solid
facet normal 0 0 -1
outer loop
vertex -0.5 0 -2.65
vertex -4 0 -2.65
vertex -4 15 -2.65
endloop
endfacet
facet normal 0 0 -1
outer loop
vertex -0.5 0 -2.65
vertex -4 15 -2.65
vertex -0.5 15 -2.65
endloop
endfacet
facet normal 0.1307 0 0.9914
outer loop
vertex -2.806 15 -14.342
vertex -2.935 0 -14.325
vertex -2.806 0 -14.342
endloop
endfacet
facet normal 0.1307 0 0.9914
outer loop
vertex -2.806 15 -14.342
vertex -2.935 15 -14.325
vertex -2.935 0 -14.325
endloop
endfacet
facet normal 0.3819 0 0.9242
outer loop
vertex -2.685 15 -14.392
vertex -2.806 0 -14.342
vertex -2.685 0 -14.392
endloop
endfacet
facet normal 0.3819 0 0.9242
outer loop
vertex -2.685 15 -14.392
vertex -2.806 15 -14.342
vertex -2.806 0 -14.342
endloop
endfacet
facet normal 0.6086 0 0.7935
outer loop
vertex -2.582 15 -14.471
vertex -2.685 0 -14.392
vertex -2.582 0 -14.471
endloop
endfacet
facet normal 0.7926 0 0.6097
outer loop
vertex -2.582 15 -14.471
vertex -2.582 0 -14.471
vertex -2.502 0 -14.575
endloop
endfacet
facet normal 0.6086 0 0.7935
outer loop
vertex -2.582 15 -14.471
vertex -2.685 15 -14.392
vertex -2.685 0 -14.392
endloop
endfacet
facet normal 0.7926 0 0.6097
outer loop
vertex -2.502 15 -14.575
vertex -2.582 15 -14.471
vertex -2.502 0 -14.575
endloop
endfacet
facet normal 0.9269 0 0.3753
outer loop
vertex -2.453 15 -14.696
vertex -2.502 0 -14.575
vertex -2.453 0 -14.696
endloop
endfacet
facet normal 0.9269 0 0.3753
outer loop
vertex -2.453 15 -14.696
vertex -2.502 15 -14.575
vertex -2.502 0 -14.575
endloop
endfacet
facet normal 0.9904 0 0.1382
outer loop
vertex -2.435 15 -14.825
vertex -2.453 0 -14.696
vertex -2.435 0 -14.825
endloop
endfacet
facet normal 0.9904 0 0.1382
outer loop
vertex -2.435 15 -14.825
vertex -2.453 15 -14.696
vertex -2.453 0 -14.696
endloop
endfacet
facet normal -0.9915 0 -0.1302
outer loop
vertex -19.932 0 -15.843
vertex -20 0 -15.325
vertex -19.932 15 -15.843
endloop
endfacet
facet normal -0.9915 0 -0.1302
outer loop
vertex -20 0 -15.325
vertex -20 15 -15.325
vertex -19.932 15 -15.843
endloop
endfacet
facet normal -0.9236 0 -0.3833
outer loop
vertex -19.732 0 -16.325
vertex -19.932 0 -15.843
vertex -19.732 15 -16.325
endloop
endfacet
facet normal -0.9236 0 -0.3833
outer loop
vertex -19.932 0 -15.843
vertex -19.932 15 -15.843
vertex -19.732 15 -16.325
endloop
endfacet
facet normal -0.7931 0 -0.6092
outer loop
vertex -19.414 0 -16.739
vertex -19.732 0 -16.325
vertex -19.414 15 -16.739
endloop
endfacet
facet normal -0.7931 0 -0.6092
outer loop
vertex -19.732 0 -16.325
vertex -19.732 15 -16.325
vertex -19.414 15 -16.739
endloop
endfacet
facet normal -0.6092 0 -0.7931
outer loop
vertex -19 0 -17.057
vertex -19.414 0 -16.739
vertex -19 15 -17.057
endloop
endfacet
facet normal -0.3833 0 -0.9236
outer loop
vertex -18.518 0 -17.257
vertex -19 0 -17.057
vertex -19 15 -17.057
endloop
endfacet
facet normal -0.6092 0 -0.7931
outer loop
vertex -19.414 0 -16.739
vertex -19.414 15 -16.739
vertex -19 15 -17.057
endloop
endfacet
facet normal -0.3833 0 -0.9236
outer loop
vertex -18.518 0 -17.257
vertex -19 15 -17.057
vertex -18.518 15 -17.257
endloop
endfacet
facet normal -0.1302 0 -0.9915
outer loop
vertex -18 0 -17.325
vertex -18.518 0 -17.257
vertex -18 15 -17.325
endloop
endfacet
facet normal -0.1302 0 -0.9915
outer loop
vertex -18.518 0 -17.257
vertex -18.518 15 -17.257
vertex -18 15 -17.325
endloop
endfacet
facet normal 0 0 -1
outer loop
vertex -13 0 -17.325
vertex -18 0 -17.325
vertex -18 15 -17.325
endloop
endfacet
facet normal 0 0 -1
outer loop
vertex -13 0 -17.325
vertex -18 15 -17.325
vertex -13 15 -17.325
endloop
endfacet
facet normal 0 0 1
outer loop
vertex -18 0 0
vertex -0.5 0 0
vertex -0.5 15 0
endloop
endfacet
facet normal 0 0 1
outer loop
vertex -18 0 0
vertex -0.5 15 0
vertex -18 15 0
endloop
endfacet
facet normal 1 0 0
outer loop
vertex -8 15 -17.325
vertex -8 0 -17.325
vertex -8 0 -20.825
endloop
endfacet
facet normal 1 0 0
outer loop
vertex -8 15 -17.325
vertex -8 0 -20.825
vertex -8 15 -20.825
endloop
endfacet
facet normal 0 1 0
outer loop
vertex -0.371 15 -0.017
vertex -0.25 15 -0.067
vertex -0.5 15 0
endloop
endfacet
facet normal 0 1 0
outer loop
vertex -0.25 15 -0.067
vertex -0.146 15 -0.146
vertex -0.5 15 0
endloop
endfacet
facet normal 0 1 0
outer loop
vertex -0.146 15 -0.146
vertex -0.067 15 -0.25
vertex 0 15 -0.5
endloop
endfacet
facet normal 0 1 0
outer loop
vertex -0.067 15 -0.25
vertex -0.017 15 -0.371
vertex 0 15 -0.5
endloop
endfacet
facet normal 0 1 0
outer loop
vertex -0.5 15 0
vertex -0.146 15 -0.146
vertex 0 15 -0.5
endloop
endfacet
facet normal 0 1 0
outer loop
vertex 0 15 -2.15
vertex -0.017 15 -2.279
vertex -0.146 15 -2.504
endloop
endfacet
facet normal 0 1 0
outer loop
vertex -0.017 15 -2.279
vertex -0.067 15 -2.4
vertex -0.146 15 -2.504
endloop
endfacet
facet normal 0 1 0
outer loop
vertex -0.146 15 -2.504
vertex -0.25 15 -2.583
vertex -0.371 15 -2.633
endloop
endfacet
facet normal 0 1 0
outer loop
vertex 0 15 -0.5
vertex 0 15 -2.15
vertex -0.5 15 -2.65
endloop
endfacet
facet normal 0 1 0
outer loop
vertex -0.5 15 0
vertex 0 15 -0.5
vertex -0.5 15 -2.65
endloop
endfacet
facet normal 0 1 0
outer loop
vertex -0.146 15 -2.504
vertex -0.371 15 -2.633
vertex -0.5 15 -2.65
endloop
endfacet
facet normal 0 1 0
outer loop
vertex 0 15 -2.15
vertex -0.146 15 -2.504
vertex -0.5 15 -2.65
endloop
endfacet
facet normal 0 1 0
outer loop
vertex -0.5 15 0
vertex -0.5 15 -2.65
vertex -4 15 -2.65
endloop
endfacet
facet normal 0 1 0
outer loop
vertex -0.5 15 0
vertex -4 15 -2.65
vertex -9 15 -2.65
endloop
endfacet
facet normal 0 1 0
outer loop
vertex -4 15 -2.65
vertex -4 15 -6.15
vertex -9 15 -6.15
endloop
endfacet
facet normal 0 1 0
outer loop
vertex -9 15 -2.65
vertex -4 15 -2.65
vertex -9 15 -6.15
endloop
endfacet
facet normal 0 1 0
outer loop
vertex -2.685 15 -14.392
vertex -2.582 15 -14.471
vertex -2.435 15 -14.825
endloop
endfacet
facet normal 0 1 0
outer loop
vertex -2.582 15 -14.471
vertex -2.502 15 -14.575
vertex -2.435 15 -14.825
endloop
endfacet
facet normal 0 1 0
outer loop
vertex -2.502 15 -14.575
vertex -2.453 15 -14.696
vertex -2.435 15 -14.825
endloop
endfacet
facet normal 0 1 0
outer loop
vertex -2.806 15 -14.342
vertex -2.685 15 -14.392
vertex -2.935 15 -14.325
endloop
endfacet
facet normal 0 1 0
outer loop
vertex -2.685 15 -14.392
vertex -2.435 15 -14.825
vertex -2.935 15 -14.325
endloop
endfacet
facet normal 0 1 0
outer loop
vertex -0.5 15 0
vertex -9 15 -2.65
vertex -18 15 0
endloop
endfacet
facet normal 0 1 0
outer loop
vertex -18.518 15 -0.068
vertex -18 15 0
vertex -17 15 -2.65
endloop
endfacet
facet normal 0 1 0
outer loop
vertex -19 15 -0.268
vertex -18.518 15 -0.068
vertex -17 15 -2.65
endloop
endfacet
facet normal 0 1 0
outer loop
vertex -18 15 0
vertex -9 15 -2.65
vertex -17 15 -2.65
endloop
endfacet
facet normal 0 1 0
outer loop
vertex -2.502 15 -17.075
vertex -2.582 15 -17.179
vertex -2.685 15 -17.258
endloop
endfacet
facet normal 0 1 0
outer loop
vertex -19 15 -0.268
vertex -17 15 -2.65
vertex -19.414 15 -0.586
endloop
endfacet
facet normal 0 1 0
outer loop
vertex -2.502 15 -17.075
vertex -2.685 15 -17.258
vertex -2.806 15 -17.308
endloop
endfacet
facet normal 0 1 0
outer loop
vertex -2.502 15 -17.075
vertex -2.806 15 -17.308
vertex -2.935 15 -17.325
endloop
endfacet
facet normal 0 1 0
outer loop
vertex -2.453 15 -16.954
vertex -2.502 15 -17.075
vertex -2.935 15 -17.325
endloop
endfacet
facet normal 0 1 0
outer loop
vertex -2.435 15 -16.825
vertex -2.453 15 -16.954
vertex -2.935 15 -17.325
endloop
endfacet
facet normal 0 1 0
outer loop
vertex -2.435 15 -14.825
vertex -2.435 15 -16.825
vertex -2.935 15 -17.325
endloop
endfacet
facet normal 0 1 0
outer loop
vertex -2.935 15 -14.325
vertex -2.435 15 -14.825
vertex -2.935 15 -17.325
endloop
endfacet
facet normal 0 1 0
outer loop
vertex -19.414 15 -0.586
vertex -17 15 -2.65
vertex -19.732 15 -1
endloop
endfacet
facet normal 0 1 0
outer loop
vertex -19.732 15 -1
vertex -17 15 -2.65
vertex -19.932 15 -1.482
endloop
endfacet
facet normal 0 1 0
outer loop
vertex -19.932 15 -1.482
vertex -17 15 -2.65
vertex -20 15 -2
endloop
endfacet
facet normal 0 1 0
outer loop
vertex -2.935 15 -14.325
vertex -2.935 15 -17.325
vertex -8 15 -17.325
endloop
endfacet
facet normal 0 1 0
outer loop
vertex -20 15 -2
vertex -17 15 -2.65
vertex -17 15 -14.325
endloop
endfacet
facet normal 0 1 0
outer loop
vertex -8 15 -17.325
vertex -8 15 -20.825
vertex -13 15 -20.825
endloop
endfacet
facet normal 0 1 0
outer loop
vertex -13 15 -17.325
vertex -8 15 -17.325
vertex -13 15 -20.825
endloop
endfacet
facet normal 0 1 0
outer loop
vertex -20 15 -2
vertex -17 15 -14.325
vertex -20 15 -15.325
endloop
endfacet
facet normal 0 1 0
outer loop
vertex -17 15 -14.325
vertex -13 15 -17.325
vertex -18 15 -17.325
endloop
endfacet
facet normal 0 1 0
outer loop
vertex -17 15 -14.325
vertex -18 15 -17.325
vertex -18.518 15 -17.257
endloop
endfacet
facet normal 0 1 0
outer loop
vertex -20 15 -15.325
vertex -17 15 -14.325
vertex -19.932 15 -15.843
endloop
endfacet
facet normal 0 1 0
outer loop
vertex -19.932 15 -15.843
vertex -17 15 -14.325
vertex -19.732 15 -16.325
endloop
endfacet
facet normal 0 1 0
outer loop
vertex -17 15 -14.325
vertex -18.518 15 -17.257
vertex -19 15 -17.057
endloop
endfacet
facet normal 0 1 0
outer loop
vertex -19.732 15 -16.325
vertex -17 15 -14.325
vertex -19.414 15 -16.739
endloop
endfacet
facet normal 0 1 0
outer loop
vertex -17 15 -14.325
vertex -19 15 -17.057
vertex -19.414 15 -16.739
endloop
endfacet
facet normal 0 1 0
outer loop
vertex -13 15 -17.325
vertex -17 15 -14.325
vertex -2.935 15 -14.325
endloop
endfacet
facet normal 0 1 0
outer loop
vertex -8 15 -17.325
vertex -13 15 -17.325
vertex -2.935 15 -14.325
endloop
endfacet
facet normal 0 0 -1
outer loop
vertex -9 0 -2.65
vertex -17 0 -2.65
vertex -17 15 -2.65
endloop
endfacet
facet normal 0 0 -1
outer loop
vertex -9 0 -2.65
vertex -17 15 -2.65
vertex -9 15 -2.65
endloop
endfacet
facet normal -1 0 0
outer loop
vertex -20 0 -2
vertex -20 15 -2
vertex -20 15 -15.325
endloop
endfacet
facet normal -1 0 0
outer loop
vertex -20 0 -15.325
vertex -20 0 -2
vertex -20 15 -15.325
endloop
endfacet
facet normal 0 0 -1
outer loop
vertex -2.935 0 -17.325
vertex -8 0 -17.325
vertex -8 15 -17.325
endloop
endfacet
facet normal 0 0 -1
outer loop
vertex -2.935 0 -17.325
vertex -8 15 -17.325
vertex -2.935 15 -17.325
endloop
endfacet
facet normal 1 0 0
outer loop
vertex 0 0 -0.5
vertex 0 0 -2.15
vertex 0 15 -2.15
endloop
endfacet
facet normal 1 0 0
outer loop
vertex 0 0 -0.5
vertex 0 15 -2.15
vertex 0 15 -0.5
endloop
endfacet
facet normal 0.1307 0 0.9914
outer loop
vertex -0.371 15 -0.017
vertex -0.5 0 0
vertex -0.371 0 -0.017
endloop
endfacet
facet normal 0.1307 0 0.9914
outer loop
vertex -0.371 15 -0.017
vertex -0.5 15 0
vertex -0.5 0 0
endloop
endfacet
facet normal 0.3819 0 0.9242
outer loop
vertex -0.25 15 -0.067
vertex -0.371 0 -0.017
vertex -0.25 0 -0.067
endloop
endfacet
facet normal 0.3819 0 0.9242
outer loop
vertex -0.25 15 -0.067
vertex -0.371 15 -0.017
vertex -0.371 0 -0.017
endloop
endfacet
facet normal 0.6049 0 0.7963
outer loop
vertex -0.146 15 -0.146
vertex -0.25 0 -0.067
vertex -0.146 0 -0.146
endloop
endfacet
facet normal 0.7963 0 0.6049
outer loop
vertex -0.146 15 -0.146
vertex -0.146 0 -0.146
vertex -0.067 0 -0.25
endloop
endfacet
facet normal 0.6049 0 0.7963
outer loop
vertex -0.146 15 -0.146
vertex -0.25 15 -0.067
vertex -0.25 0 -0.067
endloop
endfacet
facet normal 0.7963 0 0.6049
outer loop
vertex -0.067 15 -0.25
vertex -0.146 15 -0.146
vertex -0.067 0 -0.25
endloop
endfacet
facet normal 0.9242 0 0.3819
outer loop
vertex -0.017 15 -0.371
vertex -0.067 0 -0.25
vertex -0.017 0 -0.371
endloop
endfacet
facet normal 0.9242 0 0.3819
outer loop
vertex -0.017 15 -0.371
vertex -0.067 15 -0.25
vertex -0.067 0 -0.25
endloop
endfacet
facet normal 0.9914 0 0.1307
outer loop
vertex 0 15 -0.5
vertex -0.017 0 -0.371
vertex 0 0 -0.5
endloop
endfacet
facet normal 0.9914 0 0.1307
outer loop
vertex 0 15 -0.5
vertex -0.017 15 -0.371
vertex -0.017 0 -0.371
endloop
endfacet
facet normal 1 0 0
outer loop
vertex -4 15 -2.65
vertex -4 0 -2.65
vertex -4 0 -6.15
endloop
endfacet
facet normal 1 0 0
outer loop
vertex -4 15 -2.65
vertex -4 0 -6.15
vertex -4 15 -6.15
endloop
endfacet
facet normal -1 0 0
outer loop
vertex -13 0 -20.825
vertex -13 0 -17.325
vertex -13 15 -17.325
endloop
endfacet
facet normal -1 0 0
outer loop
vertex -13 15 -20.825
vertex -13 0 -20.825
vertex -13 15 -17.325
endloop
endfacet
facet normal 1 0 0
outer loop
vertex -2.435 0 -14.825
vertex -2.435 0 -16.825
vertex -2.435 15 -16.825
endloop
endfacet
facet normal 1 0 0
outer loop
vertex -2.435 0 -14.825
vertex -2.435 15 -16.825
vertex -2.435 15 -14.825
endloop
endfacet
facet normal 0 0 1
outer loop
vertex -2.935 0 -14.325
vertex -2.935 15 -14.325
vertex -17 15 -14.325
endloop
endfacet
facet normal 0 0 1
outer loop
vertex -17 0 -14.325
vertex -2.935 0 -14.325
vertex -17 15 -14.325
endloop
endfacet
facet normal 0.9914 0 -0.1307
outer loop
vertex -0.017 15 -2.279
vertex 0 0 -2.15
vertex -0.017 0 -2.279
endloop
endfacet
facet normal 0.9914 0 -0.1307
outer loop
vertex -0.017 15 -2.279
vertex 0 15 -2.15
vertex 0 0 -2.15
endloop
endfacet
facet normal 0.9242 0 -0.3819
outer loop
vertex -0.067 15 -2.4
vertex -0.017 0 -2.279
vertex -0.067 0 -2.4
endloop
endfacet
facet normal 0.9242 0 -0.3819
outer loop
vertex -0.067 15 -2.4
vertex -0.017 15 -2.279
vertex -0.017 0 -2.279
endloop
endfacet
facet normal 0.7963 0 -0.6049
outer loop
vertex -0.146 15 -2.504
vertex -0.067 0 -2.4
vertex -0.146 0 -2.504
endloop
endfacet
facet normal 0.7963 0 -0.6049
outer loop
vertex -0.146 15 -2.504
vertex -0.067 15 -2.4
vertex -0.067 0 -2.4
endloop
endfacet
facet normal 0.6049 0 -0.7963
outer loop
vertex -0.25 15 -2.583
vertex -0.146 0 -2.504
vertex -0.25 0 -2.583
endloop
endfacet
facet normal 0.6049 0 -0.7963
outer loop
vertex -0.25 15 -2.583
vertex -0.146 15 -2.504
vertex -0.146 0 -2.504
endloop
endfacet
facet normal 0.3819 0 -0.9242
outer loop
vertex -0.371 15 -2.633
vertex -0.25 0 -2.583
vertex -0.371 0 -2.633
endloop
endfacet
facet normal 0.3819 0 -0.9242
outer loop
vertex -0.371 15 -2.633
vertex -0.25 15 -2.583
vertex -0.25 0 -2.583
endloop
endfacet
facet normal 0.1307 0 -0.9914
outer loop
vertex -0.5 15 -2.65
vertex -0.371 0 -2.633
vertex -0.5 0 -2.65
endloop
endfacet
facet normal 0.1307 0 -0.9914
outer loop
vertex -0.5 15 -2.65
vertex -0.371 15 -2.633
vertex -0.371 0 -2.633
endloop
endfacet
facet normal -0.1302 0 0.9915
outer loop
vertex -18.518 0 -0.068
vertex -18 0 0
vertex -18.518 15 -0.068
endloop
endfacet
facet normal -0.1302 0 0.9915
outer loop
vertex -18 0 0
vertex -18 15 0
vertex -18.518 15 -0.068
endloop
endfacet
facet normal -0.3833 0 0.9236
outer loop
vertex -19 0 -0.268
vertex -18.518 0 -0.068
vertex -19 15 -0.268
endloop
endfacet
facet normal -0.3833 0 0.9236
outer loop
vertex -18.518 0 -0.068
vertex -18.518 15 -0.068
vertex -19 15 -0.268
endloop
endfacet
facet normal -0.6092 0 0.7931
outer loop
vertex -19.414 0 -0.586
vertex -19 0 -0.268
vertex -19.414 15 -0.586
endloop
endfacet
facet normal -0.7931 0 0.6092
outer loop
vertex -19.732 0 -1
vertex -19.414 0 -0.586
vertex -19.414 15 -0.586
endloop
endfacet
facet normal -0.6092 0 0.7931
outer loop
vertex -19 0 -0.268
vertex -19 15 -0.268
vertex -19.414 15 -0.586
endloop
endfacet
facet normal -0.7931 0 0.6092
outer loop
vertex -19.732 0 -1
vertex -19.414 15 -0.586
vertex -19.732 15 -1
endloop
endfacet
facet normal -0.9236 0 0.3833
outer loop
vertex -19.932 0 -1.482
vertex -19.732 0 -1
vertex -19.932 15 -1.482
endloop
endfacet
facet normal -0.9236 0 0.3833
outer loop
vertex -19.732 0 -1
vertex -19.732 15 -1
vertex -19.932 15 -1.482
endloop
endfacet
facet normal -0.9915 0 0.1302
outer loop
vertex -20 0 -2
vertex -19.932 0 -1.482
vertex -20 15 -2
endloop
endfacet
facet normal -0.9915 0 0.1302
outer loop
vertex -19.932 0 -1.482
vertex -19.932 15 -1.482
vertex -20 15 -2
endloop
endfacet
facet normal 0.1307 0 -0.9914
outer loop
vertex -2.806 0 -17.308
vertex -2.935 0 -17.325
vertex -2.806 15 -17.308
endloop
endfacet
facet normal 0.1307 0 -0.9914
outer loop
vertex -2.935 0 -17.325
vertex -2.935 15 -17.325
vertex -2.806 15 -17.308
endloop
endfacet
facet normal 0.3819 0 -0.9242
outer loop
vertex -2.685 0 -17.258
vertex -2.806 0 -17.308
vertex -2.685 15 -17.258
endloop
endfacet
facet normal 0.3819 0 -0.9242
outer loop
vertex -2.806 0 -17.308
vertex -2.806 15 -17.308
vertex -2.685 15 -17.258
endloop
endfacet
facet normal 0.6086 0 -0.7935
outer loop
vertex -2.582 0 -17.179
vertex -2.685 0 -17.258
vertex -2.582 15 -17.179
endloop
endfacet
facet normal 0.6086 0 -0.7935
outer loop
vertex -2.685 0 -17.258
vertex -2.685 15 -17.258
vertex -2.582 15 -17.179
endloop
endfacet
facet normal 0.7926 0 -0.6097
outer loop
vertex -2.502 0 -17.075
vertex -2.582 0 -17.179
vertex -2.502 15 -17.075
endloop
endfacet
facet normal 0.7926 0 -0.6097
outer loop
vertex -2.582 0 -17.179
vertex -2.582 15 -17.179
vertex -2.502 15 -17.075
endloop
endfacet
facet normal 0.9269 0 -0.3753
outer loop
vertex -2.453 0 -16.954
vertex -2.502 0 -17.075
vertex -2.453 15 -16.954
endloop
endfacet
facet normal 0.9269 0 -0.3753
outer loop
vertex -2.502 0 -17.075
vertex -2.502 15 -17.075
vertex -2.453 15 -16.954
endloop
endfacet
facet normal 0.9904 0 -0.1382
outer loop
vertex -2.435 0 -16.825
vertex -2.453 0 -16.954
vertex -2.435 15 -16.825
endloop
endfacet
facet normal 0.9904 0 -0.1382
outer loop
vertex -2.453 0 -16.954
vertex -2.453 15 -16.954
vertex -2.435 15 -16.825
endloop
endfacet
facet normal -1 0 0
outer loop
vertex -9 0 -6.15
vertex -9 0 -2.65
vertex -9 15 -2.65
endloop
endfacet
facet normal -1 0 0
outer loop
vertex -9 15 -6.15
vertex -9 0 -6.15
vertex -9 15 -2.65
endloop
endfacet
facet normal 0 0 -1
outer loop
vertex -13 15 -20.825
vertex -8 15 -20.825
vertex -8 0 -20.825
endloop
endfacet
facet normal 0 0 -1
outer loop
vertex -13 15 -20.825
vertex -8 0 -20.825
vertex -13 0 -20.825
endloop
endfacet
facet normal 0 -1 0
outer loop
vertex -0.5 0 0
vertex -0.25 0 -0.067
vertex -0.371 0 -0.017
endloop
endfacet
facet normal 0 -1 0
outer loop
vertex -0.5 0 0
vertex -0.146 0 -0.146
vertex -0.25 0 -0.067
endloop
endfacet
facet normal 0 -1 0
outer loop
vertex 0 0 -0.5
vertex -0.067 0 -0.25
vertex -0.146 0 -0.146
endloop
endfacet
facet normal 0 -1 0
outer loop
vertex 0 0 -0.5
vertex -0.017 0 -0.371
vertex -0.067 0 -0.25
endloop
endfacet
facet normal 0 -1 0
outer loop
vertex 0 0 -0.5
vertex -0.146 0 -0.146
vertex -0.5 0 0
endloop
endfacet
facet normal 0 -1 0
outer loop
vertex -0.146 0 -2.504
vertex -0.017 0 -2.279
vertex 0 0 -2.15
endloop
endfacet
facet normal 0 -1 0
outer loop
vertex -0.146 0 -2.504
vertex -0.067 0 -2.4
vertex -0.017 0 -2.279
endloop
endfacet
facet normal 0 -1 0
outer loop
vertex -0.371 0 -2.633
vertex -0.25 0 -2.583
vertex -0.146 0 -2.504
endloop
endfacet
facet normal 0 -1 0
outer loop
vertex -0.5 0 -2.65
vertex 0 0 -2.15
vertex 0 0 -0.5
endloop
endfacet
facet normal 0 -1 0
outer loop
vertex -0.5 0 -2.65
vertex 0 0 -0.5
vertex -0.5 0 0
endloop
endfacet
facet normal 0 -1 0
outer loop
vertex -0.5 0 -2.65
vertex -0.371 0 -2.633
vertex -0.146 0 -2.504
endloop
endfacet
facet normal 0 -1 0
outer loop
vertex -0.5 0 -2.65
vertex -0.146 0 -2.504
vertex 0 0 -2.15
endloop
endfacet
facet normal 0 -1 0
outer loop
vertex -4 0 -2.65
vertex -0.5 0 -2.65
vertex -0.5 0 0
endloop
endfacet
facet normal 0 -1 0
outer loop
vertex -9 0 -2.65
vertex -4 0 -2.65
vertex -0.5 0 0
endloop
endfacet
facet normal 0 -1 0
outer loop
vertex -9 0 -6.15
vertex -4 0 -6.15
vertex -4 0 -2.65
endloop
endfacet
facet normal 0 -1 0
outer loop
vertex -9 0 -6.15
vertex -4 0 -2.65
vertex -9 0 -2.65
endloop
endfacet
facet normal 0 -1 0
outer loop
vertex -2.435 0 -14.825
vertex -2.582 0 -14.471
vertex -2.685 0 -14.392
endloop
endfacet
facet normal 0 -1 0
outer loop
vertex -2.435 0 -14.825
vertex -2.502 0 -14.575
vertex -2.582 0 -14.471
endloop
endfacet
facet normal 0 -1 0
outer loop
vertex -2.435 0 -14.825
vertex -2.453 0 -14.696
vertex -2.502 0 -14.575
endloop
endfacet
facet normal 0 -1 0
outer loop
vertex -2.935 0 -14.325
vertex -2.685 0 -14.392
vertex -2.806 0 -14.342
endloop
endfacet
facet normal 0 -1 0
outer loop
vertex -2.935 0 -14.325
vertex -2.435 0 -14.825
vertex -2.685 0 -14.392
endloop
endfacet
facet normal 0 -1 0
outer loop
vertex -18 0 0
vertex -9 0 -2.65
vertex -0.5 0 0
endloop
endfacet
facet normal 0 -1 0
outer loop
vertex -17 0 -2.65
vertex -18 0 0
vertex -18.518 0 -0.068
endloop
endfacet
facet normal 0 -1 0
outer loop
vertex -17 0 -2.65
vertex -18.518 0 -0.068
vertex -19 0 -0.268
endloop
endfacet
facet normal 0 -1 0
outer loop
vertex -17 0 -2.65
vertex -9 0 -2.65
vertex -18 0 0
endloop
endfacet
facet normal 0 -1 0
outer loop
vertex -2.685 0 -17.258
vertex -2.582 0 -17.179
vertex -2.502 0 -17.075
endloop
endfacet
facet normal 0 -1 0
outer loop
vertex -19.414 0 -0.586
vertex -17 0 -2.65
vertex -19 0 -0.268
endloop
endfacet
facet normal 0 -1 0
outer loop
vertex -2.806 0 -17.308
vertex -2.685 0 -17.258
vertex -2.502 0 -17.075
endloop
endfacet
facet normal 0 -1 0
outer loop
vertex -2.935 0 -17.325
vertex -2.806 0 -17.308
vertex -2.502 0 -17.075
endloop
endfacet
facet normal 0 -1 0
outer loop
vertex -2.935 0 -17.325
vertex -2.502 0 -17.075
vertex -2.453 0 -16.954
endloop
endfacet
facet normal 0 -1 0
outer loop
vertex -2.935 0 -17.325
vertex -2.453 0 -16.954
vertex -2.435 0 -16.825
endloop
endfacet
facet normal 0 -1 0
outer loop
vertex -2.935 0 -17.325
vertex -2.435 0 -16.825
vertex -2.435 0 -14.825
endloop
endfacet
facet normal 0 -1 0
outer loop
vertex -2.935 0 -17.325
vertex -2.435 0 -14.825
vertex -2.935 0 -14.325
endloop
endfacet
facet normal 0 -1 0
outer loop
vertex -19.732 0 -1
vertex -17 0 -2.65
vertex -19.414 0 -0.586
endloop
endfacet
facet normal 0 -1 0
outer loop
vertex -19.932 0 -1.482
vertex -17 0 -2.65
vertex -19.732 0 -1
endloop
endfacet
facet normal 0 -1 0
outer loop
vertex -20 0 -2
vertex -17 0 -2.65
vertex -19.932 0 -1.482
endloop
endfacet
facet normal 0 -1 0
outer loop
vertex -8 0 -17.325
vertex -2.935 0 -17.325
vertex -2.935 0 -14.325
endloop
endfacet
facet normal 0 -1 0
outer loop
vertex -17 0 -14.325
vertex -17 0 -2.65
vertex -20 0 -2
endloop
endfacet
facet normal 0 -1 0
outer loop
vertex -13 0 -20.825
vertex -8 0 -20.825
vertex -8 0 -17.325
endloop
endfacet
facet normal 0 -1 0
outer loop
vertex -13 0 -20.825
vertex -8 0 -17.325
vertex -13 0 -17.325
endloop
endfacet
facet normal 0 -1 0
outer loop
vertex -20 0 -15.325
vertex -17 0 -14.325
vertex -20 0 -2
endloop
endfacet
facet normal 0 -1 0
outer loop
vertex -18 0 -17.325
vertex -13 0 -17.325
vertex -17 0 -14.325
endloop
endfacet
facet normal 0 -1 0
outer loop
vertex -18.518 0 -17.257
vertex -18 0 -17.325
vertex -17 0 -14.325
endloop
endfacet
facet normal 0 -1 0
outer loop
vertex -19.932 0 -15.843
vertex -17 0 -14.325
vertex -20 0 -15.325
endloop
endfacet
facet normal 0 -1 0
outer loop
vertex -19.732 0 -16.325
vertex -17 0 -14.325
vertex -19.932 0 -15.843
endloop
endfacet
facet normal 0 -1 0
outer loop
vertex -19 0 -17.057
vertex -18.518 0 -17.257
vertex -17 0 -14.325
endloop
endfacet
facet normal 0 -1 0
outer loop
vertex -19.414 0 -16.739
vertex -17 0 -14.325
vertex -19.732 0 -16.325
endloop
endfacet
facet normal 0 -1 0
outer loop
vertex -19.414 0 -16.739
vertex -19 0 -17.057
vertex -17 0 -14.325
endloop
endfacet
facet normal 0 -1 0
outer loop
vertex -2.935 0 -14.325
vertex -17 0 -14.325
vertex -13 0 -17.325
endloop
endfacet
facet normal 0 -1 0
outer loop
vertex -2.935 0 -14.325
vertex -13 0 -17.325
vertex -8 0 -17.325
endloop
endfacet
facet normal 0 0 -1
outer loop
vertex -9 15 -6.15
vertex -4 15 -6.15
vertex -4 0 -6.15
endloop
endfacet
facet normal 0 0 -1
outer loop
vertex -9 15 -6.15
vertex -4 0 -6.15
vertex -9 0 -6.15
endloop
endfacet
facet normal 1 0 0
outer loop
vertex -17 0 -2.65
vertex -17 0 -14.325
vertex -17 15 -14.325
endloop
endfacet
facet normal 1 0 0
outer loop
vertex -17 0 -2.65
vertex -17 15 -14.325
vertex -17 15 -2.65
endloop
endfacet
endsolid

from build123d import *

# Parameters (mm, degrees)
BOSS_EXTRUDE1_DEPTH = 15
SKETCH2_W           = 5
SKETCH2_H           = 15
BOSS_EXTRUDE2_DEPTH = 3.5
SKETCH3_W           = 5
SKETCH3_H           = 15
BOSS_EXTRUDE3_DEPTH = 3.5
FILLET1_R           = 2
FILLET2_R           = 0.5


with BuildPart() as part:
    # Sketch1 → Boss-Extrude1 (new body)
    with BuildSketch(Plane(origin=(0, 0, 0), x_dir=(1, 0, 0), z_dir=(0, 1, 0))):
        Polygon((0, 0), (-20, 0), (-20, 17.325), (-2.435474502, 17.325), (-2.435474502, 14.325), (-17, 14.325), (-17, 2.65), (0, 2.65), align=None)
    extrude(amount=BOSS_EXTRUDE1_DEPTH)

    # Sketch2 → Boss-Extrude2 (add)
    with BuildSketch(Plane(origin=(0, 0, -2.65), x_dir=(-1, 0, 0), z_dir=(0, 0, -1))):
        with Locations((6.5, 7.5)):
            Rectangle(SKETCH2_W, SKETCH2_H)
    extrude(amount=BOSS_EXTRUDE2_DEPTH)

    # Sketch3 → Boss-Extrude3 (add)
    with BuildSketch(Plane(origin=(0, 0, -17.325), x_dir=(-1, 0, 0), z_dir=(0, 0, -1))):
        with Locations((10.5, 7.5)):
            Rectangle(SKETCH3_W, SKETCH3_H)
    extrude(amount=BOSS_EXTRUDE3_DEPTH)

    # Fillet1
    fillet1_edges = [part.edges().sort_by_distance(p)[0] for p in [
        (-20, 7.5, 0),
        (-20, 7.5, -17.325),
    ]]
    fillet(fillet1_edges, radius=FILLET1_R)

    # Fillet2
    fillet2_edges = [part.edges().sort_by_distance(p)[0] for p in [
        (0, 7.5, 0),
        (-2.435474502, 7.5, -17.325),
        (-2.435474502, 7.5, -14.325),
        (0, 7.5, -2.65),
    ]]
    fillet(fillet2_edges, radius=FILLET2_R)


solid = part.part
